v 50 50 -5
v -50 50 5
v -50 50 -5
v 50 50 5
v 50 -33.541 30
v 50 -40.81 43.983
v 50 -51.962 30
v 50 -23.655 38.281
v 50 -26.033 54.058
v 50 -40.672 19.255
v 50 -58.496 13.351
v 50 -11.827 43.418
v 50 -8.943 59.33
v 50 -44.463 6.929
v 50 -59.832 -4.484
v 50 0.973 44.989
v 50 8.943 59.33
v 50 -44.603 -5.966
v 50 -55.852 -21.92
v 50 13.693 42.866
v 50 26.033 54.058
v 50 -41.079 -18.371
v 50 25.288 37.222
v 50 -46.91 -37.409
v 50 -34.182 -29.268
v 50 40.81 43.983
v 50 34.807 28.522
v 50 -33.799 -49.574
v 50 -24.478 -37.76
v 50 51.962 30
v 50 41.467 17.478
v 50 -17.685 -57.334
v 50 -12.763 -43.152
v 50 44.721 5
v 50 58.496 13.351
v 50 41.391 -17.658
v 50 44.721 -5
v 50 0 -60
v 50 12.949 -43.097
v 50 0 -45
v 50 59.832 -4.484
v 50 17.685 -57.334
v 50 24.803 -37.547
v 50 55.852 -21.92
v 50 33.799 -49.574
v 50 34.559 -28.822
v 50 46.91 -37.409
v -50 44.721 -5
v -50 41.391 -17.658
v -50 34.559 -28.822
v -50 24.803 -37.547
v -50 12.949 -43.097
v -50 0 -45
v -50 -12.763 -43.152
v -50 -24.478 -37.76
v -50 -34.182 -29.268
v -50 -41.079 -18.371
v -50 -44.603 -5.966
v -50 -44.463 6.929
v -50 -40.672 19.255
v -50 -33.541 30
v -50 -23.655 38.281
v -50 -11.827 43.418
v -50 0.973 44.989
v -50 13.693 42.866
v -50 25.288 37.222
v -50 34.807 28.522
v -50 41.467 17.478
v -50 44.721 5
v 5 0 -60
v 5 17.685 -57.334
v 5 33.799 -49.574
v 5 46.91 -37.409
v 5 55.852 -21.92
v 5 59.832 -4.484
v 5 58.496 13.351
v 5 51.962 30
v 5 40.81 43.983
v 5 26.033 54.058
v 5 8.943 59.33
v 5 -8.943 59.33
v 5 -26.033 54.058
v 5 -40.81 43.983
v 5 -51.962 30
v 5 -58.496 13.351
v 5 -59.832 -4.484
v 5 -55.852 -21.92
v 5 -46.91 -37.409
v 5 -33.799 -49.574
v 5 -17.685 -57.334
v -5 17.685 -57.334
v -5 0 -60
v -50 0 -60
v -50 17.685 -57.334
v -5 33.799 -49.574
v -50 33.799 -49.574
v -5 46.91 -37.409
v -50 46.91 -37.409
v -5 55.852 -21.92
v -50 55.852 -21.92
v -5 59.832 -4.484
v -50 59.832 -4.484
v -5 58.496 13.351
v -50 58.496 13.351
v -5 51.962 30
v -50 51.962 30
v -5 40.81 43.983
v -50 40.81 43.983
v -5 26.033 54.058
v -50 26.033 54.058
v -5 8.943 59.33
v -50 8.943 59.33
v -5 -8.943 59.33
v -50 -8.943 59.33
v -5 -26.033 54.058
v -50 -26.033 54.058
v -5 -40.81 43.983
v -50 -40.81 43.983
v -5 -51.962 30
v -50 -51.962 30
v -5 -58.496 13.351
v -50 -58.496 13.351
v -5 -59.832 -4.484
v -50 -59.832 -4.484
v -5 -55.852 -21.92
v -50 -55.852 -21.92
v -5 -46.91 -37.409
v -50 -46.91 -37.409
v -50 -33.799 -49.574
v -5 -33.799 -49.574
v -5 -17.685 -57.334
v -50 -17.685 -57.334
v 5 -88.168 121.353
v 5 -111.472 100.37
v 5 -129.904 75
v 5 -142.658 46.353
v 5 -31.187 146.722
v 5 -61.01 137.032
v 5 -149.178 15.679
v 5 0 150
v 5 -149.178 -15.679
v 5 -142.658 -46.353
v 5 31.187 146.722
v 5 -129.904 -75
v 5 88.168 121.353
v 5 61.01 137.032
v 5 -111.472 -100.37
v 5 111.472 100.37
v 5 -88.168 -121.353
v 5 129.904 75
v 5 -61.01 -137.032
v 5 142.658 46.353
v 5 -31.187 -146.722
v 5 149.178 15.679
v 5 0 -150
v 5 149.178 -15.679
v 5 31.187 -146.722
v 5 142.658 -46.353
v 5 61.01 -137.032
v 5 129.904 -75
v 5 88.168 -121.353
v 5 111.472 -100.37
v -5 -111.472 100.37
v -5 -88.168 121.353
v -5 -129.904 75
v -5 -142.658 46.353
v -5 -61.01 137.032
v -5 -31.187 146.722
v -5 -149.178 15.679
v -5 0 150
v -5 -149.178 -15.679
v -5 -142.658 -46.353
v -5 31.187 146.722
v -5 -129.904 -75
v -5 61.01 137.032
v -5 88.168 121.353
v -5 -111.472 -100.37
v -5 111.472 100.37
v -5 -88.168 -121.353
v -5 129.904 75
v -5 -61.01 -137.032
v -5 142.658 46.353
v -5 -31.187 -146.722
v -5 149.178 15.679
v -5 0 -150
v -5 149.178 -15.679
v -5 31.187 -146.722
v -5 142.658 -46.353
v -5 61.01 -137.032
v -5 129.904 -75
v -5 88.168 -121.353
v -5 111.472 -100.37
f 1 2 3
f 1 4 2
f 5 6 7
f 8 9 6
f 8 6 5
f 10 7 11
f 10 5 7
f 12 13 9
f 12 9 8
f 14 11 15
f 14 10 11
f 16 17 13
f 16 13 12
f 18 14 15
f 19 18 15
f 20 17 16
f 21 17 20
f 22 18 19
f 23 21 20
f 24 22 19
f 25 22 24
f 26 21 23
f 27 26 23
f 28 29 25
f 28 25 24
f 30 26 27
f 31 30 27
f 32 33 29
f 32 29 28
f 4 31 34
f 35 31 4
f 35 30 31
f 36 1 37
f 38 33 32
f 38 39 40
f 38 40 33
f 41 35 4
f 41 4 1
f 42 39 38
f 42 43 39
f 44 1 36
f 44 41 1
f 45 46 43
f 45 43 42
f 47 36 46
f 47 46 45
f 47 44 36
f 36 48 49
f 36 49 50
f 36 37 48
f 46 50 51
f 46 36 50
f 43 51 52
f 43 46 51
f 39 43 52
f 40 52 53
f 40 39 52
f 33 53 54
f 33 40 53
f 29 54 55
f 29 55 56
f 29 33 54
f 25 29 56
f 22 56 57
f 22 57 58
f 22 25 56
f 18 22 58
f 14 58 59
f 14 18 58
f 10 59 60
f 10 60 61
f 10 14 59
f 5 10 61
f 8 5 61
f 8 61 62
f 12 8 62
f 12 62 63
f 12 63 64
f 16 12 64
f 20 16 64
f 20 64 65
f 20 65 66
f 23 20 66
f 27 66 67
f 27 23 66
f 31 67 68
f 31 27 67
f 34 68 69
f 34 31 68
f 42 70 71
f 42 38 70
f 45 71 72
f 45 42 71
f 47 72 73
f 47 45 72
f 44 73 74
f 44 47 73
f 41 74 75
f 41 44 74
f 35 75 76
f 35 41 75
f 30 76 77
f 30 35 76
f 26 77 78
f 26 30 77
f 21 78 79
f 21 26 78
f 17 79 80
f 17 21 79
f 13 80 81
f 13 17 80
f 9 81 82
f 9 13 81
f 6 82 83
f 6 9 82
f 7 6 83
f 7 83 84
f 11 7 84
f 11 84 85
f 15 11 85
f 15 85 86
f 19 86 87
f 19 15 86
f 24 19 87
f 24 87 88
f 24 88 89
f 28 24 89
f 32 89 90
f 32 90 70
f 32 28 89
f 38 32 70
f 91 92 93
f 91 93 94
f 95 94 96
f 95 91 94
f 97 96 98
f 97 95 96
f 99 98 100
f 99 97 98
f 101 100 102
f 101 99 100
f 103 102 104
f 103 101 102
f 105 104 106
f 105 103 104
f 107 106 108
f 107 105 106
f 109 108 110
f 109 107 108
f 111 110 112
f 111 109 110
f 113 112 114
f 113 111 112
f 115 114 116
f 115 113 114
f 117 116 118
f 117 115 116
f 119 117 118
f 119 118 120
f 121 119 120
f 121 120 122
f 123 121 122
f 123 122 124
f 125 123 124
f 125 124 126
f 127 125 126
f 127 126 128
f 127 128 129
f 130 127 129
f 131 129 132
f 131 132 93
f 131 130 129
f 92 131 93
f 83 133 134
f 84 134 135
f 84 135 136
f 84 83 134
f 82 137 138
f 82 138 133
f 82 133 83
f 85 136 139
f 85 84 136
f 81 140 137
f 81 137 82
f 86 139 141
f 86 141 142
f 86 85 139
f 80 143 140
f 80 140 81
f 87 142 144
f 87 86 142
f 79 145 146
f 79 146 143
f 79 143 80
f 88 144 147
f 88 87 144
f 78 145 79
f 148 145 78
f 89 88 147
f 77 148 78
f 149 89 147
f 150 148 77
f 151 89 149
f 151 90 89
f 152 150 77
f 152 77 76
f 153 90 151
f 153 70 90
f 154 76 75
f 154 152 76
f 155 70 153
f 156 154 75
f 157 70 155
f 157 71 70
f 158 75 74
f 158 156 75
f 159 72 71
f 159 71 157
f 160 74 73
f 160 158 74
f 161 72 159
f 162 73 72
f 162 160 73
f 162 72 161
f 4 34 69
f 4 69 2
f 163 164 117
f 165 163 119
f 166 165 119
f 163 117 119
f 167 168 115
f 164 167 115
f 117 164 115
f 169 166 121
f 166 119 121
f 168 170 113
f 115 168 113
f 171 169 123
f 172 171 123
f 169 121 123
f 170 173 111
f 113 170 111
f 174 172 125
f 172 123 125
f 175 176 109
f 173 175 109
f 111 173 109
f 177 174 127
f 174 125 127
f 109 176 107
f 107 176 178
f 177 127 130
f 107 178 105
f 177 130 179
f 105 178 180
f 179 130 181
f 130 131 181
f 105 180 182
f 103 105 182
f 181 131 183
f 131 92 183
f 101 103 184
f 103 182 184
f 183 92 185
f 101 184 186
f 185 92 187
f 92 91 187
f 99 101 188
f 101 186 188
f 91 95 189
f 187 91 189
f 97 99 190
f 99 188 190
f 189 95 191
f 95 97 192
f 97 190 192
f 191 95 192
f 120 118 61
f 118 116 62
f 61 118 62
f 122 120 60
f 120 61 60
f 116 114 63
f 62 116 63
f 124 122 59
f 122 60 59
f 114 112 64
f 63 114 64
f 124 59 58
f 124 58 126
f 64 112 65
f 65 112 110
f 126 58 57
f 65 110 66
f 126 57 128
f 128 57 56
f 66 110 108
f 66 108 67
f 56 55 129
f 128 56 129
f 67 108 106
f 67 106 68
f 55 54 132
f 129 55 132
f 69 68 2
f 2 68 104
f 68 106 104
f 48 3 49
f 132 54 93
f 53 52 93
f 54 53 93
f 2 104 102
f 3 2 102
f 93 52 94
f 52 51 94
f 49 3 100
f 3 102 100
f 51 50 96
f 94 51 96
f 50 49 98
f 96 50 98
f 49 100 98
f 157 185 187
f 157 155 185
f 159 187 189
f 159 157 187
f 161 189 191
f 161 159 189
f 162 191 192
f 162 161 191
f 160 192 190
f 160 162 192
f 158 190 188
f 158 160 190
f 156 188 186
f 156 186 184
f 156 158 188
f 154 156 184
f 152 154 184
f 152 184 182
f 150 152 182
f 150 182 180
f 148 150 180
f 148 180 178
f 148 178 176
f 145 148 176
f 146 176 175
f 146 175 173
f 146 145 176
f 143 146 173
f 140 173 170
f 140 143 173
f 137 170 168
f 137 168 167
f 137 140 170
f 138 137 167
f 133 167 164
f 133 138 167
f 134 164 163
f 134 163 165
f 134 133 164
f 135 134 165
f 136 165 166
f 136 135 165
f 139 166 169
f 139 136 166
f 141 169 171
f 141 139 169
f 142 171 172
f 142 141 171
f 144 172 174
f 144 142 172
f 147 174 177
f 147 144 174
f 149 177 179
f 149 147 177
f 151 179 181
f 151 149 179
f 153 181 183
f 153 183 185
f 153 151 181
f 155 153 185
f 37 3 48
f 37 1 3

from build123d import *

# Parameters (mm, degrees)
SKETCH1_R           = 60
BOSS_EXTRUDE1_DEPTH = 50
SKETCH1_3_R         = 150
SKETCH1_3_R_2       = 60
BOSS_EXTRUDE2_DEPTH = 5


with BuildPart() as part:
    # Sketch1 → Boss-Extrude1 (new, symmetric)
    with BuildSketch(Plane(origin=(0, 0, 0), x_dir=(0, 0, -1), z_dir=(1, 0, 0))):
        Circle(SKETCH1_R)
        with BuildLine():
            ThreePointArc((45, 0), (-30, -33.541019662), (-5, 44.72135955))
            Line((-5, 44.72135955), (-5, 50))
            Line((-5, 50), (5, 50))
            Line((5, 50), (5, 44.72135955))
            ThreePointArc((5, 44.72135955), (33.541019662, 30), (45, 0))
        make_face(mode=Mode.SUBTRACT)
    extrude(amount=BOSS_EXTRUDE1_DEPTH, both=True)

    # Sketch1<3> → Boss-Extrude2 (add, symmetric)
    with BuildSketch(Plane(origin=(0, 0, 0), x_dir=(0, 0, -1), z_dir=(1, 0, 0))):
        Circle(SKETCH1_3_R)
        Circle(SKETCH1_3_R_2, mode=Mode.SUBTRACT)
    extrude(amount=BOSS_EXTRUDE2_DEPTH, both=True)


solid = part.part
